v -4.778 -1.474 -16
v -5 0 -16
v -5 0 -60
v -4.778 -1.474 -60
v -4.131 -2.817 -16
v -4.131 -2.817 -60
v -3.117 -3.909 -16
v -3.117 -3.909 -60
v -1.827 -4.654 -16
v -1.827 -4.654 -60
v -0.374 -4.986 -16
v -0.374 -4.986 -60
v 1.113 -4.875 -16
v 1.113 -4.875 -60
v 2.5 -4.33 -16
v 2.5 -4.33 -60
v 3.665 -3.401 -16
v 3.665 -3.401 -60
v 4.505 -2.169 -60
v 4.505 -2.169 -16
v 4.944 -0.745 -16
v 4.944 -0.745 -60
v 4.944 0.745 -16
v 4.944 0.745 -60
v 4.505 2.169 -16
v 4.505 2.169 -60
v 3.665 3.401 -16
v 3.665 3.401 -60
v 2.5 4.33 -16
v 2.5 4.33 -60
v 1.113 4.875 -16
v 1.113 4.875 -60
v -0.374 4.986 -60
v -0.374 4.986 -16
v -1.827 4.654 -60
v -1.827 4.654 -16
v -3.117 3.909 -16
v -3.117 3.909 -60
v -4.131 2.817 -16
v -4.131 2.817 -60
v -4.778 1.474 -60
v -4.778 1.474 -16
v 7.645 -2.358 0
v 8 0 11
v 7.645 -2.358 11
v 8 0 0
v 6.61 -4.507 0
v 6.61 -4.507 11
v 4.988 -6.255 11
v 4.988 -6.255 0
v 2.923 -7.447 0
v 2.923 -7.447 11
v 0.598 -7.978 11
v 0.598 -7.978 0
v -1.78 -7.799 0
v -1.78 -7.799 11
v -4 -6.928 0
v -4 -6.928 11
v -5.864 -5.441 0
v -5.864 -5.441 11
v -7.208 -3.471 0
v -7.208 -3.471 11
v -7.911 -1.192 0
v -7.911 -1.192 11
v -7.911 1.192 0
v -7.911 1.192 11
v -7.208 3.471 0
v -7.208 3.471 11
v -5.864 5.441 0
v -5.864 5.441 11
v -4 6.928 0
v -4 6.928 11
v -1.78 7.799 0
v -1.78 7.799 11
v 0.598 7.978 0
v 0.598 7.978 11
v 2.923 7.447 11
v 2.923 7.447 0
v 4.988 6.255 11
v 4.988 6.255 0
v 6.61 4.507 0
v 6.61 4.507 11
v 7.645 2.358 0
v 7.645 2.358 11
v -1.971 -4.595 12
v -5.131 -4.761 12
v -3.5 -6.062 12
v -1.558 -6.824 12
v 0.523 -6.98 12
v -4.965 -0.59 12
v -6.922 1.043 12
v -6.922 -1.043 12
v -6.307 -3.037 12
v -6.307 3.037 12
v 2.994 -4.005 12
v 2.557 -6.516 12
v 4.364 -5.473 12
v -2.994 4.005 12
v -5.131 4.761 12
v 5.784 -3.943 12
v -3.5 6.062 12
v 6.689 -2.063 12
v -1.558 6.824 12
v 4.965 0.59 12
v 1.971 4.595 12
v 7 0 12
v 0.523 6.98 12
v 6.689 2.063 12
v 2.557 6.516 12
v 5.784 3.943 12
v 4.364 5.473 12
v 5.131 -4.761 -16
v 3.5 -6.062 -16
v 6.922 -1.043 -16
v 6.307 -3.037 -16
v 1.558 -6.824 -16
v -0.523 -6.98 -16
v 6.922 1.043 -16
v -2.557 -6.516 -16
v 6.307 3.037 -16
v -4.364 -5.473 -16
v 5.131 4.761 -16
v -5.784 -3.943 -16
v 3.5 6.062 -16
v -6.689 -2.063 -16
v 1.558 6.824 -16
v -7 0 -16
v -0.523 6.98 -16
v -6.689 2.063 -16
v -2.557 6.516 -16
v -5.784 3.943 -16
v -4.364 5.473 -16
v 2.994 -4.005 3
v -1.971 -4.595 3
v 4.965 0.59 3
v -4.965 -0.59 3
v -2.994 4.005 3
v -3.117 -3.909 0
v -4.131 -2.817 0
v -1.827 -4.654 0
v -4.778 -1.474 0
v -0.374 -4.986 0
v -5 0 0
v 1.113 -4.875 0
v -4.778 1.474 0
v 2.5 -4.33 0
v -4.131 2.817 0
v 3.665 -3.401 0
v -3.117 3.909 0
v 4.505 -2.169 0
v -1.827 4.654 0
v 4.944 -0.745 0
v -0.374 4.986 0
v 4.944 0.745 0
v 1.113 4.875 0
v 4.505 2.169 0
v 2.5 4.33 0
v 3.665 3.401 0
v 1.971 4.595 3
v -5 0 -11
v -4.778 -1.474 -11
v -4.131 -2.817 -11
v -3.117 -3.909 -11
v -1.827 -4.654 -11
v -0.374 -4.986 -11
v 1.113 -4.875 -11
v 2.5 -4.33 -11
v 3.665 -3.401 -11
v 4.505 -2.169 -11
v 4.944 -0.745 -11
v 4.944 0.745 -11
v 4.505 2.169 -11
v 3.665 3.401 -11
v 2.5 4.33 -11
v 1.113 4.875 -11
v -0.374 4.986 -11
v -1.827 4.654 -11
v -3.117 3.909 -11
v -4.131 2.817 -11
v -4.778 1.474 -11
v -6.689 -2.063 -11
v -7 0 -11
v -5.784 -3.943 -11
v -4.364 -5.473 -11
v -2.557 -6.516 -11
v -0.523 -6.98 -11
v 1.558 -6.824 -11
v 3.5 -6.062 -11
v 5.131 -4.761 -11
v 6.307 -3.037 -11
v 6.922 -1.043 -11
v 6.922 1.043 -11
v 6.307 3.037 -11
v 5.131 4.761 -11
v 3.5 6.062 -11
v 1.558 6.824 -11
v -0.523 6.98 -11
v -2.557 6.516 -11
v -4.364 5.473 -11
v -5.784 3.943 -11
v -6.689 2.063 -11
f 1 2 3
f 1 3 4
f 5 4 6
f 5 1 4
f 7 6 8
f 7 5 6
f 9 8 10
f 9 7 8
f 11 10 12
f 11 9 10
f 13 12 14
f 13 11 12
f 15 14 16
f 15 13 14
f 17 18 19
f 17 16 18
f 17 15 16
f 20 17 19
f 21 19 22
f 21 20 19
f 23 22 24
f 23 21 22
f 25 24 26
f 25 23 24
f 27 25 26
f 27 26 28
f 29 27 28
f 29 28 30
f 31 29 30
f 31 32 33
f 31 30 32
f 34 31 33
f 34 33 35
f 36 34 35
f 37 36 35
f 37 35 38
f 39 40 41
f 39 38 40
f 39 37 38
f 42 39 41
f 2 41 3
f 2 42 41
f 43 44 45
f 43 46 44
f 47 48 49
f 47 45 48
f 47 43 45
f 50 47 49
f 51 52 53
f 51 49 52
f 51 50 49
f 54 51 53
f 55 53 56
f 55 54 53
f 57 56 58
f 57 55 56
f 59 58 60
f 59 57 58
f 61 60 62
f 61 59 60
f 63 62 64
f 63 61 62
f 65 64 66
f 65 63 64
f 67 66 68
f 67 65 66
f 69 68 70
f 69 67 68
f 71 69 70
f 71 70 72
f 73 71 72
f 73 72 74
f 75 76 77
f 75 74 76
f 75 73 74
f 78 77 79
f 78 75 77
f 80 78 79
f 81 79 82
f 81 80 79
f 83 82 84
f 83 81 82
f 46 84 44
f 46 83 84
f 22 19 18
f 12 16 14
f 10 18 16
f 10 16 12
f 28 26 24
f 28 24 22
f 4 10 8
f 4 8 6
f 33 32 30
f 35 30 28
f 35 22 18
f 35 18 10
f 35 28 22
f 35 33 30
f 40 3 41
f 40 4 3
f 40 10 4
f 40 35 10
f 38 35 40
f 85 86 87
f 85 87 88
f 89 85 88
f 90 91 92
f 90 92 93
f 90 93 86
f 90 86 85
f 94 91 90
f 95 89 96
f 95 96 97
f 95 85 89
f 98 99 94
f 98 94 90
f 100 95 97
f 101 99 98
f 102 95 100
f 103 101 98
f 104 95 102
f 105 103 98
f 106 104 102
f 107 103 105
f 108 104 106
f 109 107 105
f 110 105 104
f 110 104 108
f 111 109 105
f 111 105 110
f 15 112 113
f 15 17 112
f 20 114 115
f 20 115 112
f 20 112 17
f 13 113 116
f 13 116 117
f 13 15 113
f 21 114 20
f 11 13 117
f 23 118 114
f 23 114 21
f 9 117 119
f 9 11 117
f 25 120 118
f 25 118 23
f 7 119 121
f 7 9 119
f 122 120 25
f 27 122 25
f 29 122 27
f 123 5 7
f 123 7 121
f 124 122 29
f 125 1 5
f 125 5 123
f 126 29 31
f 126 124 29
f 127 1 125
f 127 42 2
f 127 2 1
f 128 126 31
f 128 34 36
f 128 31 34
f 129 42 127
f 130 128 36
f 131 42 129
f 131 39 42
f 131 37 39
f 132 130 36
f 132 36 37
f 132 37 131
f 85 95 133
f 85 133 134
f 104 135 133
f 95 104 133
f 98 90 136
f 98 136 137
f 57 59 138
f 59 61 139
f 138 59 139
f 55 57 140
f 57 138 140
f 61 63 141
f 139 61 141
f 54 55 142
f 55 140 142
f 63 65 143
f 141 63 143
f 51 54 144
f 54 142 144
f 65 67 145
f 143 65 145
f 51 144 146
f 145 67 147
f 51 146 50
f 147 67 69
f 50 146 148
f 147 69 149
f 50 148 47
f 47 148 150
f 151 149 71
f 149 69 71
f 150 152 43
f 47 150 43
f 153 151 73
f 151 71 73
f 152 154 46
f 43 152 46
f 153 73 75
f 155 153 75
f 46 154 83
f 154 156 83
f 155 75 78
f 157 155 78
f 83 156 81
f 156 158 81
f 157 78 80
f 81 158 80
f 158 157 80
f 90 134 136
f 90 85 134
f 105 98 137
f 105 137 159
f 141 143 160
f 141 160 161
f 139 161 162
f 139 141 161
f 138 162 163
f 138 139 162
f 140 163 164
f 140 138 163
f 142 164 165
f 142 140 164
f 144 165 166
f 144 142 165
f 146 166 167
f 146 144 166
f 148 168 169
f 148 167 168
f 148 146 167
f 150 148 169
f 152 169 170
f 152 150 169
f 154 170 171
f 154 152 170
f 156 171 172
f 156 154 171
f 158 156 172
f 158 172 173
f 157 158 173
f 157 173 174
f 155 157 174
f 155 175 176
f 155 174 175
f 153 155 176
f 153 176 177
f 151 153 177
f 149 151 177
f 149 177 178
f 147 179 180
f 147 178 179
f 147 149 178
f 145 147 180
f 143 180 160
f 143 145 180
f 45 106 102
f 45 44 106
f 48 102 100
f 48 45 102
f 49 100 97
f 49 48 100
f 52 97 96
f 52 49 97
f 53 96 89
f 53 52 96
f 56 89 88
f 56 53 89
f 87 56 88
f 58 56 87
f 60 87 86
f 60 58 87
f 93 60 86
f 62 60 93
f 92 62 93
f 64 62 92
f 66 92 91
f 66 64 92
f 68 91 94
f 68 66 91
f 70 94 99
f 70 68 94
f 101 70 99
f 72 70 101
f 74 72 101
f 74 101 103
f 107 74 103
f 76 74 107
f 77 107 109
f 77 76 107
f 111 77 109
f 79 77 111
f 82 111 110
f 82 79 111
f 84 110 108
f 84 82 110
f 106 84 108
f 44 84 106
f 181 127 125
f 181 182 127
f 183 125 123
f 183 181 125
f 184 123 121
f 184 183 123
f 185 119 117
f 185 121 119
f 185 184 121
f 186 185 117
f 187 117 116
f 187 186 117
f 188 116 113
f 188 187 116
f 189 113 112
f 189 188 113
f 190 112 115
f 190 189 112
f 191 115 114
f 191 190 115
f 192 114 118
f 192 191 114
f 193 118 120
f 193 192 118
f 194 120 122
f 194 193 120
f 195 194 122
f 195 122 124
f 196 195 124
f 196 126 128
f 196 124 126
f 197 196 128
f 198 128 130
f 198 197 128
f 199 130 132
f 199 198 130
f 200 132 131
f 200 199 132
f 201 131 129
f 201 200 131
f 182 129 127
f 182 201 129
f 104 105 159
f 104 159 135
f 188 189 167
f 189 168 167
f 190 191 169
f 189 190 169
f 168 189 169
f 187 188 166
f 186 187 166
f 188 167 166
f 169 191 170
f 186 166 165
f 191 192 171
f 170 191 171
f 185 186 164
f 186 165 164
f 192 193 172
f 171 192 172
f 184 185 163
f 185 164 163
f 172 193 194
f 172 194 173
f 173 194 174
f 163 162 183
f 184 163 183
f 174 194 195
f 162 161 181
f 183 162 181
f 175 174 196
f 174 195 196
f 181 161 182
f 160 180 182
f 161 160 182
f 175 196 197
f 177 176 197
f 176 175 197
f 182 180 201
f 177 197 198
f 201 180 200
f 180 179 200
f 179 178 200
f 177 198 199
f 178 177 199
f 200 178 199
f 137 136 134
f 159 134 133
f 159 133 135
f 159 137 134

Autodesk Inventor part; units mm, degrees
ref_plane "YZ Plane" through (0, 0, 0) normal (1, 0, 0) x (0, 1, 0)
ref_plane "XZ Plane" through (0, 0, 0) normal (0, 1, 0) x (-1, 0, 0)
ref_plane "XY Plane" through (0, 0, 0) normal (0, 0, 1) x (1, 0, 0)
sketch "Sketch1" plane through (0, 0, 0) normal (0, 0, 1) x (1, 0, 0)
  circle A0 centre (0, 0) radius 8
  dimension "d0" = 16
extrude "Extrusion1" add sketch "Sketch1" along normal blind 12
sketch "Sketch2" plane through (0, 0, 12) normal (0, 0, 1) x (1, 0, 0)
  circle A0 centre (0, 0) radius 5
  line L0 (1.9714, 4.5949) -> (4.9651, 0.5901)
  line L1 (4.9651, 0.5901) -> (2.9936, -4.0048)
  line L2 (2.9936, -4.0048) -> (-1.9714, -4.5949)
  line L3 (-1.9714, -4.5949) -> (-4.9651, -0.5901)
  line L4 (-4.9651, -0.5901) -> (-2.9936, 4.0048)
  line L5 (-2.9936, 4.0048) -> (1.9714, 4.5949)
  dimension "d3" = 10
extrude "Extrusion2" cut sketch "Sketch2" against normal blind 9 contours L1 L2 L3 L4 L5 L0
sketch "Sketch3" plane through (0, 0, 0) normal (0, 0, -1) x (-1, 0, 0)
  circle A0 centre (0, 0) radius 5
  dimension "d6" = 10
extrude "Extrusion3" add sketch "Sketch3" along normal blind 11
sketch "Sketch4" plane through (0, 0, -11) normal (0, 0, -1) x (-1, 0, 0)
  circle A0 centre (0, 0) radius 7
  dimension "d9" = 14
extrude "Extrusion4" add sketch "Sketch4" along normal blind 5
sketch "Sketch5" plane through (0, 0, -16) normal (0, 0, -1) x (-1, 0, 0)
  circle A0 centre (0, 0) radius 5
  dimension "d12" = 10
extrude "Extrusion5" add sketch "Sketch5" along normal blind 44
thread "Thread1" size "M10x1.5" class "6g" standard "ANSI Metric M Profile" full length
chamfer "Chamfer1" distance 1 angle 45 1 edges at (-8, 0, 12)
equation "\"BendRadius\" = Thickness"
equation "\"BendReliefWidth\" = Thickness"
equation "\"BendReliefDepth\" = 0.5 * Thickness"
equation "\"CornerReliefSize\" = 4 * Thickness"
equation "\"MinimumRemnant\" = 2 * Thickness"
equation "\"TransitionRadius\" = BendRadius"
equation "\"JacobiRadiusSize\" = BendRadius"
equation "\"GapSize\" = Thickness"
equation "\"Thickness\" = 0.5"
properties part number "Adjusting Screw"
